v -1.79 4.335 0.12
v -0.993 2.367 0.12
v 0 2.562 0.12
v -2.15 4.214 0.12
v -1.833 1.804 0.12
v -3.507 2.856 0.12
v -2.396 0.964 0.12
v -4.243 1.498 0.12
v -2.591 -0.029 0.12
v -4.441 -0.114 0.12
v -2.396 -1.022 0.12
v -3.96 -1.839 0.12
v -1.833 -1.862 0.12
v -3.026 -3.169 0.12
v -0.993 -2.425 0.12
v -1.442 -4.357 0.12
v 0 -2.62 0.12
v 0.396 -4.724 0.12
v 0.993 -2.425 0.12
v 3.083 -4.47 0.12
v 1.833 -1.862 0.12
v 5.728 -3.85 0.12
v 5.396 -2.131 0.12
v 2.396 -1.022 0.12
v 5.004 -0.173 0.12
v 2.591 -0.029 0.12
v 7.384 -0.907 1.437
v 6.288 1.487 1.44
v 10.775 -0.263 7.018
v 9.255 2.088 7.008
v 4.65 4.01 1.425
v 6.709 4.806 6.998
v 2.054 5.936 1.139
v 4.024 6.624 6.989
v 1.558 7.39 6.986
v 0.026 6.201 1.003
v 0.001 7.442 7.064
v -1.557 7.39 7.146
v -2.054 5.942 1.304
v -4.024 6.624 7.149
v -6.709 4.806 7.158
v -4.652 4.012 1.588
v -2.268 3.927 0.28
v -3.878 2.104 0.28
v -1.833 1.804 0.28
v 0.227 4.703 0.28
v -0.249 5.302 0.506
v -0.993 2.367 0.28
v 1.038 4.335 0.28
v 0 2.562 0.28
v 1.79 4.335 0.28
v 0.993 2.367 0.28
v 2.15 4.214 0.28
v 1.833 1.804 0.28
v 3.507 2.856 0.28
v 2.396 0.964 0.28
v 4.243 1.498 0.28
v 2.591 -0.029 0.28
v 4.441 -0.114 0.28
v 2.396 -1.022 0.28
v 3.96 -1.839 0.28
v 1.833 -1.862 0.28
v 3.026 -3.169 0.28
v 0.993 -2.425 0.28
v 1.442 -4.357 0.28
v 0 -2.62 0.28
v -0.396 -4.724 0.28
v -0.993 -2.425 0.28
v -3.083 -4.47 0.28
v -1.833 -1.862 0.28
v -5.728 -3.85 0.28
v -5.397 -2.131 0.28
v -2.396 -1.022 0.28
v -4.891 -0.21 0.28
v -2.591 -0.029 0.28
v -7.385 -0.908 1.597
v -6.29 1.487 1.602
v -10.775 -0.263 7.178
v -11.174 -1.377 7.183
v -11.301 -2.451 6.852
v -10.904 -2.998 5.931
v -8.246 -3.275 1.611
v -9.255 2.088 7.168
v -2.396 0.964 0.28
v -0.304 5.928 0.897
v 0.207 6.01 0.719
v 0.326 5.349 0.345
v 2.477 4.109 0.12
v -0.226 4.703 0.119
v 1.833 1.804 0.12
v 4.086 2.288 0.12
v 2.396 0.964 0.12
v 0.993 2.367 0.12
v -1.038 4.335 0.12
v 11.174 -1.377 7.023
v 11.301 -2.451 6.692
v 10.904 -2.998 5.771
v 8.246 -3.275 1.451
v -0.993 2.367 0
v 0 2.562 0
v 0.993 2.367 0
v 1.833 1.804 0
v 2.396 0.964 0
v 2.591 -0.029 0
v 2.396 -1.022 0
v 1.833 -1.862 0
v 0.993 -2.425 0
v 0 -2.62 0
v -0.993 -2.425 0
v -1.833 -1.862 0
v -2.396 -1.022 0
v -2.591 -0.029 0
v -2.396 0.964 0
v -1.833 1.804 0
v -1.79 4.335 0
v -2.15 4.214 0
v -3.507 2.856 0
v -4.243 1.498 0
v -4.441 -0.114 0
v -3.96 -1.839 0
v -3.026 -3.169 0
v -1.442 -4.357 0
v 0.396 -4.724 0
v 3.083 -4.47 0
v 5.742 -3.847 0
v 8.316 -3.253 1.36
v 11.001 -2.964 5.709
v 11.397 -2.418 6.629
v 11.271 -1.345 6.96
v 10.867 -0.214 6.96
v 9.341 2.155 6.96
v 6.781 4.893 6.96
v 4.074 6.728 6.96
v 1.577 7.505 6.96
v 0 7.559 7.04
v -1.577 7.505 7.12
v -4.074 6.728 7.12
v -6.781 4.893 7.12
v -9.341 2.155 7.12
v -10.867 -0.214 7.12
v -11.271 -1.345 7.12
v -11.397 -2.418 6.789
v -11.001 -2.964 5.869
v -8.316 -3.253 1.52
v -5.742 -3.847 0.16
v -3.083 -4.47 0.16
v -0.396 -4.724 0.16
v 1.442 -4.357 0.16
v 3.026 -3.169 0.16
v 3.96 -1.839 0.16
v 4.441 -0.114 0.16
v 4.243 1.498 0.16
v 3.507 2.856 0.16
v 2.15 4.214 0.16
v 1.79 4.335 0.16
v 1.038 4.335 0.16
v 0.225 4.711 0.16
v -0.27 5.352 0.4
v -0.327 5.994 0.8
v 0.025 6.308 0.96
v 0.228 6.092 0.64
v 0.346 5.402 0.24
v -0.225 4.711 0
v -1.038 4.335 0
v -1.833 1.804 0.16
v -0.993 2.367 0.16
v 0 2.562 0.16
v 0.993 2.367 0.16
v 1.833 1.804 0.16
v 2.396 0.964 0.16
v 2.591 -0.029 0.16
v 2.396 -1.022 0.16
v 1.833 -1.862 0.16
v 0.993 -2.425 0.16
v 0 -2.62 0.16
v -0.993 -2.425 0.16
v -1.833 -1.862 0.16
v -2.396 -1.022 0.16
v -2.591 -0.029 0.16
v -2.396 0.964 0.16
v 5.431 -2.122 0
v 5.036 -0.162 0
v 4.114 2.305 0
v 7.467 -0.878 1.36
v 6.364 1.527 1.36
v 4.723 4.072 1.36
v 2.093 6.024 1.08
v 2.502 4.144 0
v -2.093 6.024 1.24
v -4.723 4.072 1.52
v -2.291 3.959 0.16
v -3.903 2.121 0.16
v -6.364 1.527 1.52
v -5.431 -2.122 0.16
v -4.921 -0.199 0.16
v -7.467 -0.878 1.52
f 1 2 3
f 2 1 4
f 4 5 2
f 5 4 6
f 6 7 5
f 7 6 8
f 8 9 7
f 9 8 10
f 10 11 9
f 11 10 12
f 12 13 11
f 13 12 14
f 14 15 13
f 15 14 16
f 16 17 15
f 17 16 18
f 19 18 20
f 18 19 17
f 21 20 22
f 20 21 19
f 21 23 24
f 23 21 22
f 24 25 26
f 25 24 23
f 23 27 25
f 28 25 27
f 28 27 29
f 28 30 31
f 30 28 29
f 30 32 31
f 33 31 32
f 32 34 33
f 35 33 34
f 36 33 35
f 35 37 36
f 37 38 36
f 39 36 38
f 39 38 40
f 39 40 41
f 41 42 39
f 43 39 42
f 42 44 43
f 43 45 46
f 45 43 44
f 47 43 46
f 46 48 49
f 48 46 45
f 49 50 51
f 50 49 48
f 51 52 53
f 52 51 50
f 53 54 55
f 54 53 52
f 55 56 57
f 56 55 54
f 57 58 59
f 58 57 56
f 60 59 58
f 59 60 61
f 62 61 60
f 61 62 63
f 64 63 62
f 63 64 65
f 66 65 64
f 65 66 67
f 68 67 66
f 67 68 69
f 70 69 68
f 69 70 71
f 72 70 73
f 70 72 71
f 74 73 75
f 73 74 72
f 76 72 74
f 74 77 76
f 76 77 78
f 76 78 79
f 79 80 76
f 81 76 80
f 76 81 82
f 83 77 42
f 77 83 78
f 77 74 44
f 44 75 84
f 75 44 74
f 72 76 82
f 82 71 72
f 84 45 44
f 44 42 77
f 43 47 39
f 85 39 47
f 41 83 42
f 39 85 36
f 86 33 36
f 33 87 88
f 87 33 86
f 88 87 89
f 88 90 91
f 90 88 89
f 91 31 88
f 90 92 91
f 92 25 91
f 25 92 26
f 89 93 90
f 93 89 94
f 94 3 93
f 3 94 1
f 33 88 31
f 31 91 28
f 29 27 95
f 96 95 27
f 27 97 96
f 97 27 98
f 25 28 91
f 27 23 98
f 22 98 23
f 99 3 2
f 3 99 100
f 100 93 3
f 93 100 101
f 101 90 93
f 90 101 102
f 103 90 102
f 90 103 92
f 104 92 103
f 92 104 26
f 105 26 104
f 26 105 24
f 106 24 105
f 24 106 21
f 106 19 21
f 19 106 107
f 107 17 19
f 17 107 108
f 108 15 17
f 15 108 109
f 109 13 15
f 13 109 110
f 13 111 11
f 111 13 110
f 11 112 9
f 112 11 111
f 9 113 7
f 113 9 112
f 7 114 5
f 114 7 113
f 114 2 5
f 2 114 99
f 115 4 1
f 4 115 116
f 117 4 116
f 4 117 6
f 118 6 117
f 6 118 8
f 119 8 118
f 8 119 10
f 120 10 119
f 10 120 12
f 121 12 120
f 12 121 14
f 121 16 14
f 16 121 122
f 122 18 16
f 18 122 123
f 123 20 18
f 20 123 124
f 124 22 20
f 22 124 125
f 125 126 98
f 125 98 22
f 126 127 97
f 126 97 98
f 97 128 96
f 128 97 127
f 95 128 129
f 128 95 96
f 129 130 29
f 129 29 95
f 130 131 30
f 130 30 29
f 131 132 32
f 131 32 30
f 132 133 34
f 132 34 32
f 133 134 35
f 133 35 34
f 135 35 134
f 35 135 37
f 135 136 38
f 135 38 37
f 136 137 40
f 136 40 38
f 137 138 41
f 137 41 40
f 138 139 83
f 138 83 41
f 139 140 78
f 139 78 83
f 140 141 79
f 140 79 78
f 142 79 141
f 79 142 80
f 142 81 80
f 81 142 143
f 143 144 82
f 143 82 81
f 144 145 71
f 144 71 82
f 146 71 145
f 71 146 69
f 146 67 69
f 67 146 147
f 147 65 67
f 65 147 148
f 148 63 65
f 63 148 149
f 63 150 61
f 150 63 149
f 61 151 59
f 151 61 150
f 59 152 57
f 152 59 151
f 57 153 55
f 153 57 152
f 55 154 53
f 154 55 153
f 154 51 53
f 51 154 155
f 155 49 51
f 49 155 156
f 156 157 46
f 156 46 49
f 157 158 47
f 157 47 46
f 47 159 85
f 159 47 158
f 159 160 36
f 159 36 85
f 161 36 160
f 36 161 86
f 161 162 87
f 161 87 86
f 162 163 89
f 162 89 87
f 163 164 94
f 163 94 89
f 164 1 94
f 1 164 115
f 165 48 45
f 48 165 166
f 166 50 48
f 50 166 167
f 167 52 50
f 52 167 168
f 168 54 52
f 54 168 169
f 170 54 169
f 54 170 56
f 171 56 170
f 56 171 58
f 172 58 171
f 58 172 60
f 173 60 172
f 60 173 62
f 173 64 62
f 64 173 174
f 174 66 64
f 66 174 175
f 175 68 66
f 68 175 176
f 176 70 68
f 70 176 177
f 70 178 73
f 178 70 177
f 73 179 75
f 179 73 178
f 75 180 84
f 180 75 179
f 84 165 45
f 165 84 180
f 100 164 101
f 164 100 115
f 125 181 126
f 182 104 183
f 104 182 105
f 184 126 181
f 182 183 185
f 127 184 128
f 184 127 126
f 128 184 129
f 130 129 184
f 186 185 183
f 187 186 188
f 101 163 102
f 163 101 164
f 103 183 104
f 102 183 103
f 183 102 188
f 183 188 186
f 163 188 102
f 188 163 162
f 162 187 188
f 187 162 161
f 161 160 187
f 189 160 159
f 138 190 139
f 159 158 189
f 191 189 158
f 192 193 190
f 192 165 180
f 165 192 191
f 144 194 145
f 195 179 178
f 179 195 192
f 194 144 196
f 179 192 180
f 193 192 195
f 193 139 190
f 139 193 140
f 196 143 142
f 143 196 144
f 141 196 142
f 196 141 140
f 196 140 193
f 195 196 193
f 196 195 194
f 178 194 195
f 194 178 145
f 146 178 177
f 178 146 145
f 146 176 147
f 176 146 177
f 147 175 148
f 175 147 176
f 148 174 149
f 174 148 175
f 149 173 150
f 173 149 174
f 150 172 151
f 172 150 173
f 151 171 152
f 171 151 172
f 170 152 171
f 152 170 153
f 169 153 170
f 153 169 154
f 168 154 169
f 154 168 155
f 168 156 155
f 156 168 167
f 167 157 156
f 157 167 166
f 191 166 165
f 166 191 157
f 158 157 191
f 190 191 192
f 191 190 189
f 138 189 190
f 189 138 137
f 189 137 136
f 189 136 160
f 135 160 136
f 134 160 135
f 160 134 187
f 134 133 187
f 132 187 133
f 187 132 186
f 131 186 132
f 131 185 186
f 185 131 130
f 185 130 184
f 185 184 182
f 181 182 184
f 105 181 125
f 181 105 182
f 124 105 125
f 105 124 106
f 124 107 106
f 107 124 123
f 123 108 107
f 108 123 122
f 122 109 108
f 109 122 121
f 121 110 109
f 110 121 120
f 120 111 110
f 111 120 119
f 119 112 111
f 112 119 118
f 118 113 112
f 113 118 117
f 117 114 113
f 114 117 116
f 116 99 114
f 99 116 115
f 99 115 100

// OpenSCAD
use <../lib.scad>
use <s/20551c01s01.scad>
use <s/20551c01s02.scad>
function ldraw_lib__20551p01c01() = [
// 0 Minifig Cape Cloth High Rounded Collar with Black Outside Pattern (Formed)
// 0 Name: 20551p01c01.dat
// 0 Author: Philippe Hurbain [Philo]
// 0 !LDRAW_ORG Part UPDATE 2020-03
// 0 !LICENSE Licensed under CC BY 2.0 and CC BY 4.0 : see CAreadme.txt
// 
// 0 BFC CERTIFY CCW
  [0,"BFC","CERTIFY"],
  [0,"BFC","CCW"],
// 
// 0 !CATEGORY Sheet Fabric
// 0 !KEYWORDS Cloak, Neckwear
// 
// 0 !HISTORY 2020-12-29 [PTadmin] Official Update 2020-03
// 
// 
// 1 16 0 0 0 1 0 0 0 1 0 0 0 1 s\20551c01s01.dat
  [1,16,0,0,0,1,0,0,0,1,0,0,0,1, ldraw_lib__s__20551c01s01()],
// 1 0 0 0 0 1 0 0 0 1 0 0 0 1 s\20551c01s02.dat
  [1,0,0,0,0,1,0,0,0,1,0,0,0,1, ldraw_lib__s__20551c01s02()],
];
makepoly(ldraw_lib__20551p01c01(), line=0.2);
